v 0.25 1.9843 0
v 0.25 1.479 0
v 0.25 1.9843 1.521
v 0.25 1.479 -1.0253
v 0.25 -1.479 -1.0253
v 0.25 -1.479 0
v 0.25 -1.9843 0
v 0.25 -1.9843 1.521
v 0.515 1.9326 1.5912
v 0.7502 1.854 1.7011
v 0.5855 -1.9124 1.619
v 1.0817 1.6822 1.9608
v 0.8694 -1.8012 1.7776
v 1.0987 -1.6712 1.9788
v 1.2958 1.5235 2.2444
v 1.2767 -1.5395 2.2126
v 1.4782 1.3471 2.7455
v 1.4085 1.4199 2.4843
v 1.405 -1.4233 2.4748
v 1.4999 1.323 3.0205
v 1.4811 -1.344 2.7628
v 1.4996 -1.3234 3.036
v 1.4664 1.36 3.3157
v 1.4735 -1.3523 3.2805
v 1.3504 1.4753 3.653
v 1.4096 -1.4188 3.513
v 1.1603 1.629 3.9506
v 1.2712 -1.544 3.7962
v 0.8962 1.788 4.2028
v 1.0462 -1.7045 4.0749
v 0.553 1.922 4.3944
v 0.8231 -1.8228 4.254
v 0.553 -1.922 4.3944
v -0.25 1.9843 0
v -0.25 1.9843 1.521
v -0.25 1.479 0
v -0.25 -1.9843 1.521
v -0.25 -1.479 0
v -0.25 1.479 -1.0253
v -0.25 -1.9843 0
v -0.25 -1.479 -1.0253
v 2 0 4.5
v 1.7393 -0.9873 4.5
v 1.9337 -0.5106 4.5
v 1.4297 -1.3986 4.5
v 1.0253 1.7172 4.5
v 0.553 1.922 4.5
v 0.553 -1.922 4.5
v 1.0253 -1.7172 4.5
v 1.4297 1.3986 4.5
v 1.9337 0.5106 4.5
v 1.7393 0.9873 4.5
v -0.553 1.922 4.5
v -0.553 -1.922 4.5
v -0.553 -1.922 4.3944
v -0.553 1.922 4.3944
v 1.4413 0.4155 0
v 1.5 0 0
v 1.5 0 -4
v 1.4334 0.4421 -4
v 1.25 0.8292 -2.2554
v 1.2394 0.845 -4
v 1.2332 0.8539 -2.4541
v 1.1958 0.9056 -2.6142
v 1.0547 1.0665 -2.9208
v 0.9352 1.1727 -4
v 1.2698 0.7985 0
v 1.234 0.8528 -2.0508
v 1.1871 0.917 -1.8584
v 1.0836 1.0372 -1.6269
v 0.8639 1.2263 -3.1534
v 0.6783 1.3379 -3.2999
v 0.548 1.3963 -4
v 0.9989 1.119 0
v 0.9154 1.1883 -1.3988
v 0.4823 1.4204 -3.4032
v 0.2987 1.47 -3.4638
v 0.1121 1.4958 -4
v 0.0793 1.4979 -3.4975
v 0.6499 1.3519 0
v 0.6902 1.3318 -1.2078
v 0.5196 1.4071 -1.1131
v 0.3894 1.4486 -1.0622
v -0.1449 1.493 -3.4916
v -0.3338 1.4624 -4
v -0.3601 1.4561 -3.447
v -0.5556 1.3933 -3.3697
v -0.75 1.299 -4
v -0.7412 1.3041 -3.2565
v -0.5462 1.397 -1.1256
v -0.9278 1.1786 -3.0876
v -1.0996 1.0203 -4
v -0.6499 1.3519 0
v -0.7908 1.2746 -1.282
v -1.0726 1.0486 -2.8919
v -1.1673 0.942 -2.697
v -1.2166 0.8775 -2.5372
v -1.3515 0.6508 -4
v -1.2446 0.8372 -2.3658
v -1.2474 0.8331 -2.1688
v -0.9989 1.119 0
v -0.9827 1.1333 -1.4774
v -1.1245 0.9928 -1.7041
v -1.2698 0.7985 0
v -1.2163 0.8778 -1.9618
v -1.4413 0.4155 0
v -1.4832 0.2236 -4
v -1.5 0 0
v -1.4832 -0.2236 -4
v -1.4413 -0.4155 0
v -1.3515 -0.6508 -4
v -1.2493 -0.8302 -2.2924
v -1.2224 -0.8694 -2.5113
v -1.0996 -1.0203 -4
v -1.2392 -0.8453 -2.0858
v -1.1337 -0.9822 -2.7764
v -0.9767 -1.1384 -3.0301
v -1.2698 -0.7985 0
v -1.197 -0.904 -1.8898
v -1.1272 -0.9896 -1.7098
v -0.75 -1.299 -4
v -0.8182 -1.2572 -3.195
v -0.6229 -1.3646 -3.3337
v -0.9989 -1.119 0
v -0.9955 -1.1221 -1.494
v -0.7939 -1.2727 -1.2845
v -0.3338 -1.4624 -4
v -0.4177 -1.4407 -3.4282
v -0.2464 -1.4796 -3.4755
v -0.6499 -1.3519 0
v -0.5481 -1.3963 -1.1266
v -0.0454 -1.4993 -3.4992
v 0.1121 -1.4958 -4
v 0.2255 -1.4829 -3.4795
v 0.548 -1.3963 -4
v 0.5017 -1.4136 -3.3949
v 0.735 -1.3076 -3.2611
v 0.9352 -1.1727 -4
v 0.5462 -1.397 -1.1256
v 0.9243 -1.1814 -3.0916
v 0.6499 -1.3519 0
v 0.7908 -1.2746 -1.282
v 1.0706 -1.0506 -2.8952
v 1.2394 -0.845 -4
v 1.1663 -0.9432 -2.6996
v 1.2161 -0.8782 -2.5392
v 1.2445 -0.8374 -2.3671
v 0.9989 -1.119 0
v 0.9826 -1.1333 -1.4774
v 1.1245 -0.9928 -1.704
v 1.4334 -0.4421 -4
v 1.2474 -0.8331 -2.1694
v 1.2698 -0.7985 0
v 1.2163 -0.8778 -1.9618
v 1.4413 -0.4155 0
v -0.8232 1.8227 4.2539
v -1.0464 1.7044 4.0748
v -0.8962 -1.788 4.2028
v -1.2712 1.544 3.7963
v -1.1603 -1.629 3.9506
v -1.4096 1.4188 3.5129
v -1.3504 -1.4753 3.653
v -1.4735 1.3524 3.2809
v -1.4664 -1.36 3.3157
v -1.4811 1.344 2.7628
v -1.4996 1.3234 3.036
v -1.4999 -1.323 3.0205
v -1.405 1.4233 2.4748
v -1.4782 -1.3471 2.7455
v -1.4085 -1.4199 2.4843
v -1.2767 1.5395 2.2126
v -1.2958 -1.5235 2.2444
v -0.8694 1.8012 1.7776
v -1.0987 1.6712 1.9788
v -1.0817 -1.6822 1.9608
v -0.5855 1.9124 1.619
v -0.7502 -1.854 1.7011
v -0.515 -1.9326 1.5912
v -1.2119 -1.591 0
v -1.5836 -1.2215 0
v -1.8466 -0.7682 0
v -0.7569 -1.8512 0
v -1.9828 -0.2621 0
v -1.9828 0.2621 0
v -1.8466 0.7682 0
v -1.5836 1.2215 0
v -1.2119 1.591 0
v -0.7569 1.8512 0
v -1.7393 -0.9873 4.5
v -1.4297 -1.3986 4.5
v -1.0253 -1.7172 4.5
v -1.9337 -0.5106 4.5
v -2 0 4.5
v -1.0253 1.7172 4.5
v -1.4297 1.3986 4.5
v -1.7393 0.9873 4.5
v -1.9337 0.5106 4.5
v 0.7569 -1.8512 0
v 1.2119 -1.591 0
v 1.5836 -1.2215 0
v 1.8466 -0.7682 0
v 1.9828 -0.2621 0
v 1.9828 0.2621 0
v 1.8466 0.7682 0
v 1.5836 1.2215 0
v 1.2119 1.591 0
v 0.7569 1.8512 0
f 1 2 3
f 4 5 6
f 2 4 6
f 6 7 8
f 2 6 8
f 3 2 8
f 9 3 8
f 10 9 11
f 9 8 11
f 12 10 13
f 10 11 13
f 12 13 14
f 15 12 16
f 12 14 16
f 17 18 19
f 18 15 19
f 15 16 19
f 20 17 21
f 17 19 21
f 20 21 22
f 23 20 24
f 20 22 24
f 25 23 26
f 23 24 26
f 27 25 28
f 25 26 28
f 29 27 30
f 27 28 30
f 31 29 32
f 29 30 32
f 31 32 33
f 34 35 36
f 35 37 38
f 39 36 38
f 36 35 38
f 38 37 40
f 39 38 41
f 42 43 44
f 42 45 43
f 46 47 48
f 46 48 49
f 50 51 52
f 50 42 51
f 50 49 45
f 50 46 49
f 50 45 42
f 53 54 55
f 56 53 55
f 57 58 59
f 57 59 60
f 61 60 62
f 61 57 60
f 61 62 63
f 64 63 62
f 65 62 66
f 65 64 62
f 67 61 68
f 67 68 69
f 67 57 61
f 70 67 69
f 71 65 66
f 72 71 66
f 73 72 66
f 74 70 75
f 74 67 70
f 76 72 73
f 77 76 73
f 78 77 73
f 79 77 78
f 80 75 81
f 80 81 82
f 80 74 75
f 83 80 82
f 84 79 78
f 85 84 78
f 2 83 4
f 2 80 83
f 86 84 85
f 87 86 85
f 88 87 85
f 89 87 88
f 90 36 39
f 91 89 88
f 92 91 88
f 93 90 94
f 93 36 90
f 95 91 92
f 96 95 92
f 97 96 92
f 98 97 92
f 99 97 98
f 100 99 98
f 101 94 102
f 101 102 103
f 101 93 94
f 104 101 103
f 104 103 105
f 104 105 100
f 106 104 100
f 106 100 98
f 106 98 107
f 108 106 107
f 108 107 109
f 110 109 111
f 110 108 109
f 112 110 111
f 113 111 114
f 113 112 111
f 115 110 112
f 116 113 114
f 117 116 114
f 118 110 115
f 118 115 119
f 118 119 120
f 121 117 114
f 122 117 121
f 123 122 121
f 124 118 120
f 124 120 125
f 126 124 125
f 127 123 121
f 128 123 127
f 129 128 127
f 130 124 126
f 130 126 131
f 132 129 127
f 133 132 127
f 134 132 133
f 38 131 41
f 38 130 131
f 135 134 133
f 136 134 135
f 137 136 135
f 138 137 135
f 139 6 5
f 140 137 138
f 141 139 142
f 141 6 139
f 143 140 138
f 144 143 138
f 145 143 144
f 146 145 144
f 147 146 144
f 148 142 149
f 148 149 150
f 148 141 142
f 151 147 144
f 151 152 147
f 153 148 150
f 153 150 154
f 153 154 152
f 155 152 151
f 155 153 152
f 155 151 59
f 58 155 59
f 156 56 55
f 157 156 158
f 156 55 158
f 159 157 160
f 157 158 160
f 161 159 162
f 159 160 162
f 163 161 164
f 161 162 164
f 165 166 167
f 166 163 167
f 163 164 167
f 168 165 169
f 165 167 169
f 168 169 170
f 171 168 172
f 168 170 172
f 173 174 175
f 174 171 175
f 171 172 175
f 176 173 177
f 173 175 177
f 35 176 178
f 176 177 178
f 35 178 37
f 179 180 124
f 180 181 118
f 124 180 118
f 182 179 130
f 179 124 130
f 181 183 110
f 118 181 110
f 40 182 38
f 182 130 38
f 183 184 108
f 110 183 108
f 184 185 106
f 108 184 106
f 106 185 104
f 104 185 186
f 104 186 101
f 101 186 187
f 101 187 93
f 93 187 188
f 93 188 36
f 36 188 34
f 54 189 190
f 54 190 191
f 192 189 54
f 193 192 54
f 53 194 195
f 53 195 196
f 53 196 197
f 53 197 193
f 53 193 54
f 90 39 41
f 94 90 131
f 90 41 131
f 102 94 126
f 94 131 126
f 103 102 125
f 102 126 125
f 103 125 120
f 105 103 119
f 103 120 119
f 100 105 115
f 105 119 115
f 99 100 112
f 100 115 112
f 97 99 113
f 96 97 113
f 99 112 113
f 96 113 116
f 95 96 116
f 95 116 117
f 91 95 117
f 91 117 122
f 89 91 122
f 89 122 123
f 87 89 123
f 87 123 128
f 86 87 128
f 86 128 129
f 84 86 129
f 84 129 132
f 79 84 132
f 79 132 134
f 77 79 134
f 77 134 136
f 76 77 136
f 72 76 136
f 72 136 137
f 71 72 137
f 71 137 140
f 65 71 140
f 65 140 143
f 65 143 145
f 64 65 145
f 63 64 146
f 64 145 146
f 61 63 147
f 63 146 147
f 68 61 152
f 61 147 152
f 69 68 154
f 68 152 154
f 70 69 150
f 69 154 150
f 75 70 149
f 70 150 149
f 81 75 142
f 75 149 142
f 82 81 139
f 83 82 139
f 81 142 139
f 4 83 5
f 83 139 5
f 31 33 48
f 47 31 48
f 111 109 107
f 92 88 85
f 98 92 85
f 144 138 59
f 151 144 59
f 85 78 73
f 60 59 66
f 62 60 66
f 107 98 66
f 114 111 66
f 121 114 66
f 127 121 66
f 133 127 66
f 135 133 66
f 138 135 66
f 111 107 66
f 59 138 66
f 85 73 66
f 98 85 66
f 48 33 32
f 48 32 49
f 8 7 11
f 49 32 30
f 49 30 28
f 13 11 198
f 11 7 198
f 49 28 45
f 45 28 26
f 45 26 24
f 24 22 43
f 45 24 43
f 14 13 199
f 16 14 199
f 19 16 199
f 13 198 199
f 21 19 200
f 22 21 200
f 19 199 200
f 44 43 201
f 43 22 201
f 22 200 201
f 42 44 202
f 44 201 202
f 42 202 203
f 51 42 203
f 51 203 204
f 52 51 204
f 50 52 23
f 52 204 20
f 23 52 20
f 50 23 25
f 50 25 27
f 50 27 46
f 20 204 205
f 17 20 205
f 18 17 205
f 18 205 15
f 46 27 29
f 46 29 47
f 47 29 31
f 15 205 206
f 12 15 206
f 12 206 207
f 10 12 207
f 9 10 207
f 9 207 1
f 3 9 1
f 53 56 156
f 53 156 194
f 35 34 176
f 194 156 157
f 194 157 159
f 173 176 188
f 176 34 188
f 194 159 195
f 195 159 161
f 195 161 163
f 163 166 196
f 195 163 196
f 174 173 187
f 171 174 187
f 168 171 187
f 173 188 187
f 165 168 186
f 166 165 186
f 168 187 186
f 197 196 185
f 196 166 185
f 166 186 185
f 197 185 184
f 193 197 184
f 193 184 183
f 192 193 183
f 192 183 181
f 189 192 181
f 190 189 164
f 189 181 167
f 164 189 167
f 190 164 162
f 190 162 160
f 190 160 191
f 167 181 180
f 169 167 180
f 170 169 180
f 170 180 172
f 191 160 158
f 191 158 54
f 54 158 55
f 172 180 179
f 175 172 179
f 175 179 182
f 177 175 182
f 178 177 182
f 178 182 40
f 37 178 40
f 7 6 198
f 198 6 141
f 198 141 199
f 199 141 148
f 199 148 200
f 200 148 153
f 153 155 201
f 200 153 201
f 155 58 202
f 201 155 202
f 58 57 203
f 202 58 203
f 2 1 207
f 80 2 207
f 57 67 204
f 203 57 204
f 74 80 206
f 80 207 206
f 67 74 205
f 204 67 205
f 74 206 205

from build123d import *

# Parameters (mm, degrees)
F0_R     = 1.5
F1_DEPTH = 4
F0_R_2   = 2
F2_DEPTH = 4.5
F4_DEPTH = 2.5


with BuildPart() as f1:
    # F0 (on Top) → F1 (new body)
    with BuildSketch(Plane.XY):
        Circle(F0_R)
    extrude(amount=-F1_DEPTH)

    # F0 (on Top) → F2 (join)
    with BuildSketch(Plane.XY):
        Circle(F0_R_2)
        Circle(F0_R, mode=Mode.SUBTRACT)
        Circle(F0_R)
    extrude(amount=F2_DEPTH)

    # F3 (on Front) → F4 (cut, symmetric)
    with BuildSketch(Plane.XZ):
        with BuildLine():
            ThreePointArc((0.25, 1.5209800542), (1.1456439237, 2.0317541634), (1.5, 3))
            ThreePointArc((1.5, 3), (1.2408554332, 3.8427798015), (0.5529629416, 4.3943571943))
            Line((0.5529629416, 4.3943571943), (-0.5529629416, 4.3943571943))
            ThreePointArc((-0.5529629416, 4.3943571943), (-1.4917310142, 2.8427149678), (-0.25, 1.5209800542))
            Line((-0.25, 1.5209800542), (0.25, 1.5209800542))
        make_face()
        with BuildLine():
            Line((-0.5529629416, 4.3943571943), (0.5529629416, 4.3943571943))
            ThreePointArc((0.5529629416, 4.3943571943), (0.2814819786, 4.473352604), (0, 4.5))
            ThreePointArc((0, 4.5), (-0.2814819786, 4.473352604), (-0.5529629416, 4.3943571943))
        make_face()
        with BuildLine():
            ThreePointArc((0, 4.5), (0.2814819786, 4.473352604), (0.5529629416, 4.3943571943))
            Line((0.5529629416, 4.3943571943), (0.5529629416, 4.5))
            Line((0.5529629416, 4.5), (0, 4.5))
        make_face()
        with BuildLine():
            Line((0.25, -1.0252551286), (0.25, 1.5209800542))
            ThreePointArc((0.25, 1.5209800542), (0, 1.5), (-0.25, 1.5209800542))
            Line((-0.25, 1.5209800542), (-0.25, -1.0252551286))
            ThreePointArc((-0.25, -1.0252551286), (0, -1), (0.25, -1.0252551286))
        make_face()
        with BuildLine():
            ThreePointArc((-0.25, 1.5209800542), (0, 1.5), (0.25, 1.5209800542))
            Line((0.25, 1.5209800542), (-0.25, 1.5209800542))
        make_face()
        with BuildLine():
            ThreePointArc((-0.5529629416, 4.3943571943), (-0.2814819786, 4.473352604), (0, 4.5))
            Line((0, 4.5), (-0.5529629416, 4.5))
            Line((-0.5529629416, 4.5), (-0.5529629416, 4.3943571943))
        make_face()
        with BuildLine():
            Line((-0.25, -1.0252551286), (0.25, -1.0252551286))
            ThreePointArc((0.25, -1.0252551286), (0, -1), (-0.25, -1.0252551286))
        make_face()
        with BuildLine():
            ThreePointArc((1.25, -2.25), (0.9682458366, -1.459430585), (0.25, -1.0252551286))
            Line((0.25, -1.0252551286), (-0.25, -1.0252551286))
            ThreePointArc((-0.25, -1.0252551286), (-0.790569415, -3.2182458366), (1.25, -2.25))
        make_face()
    extrude(amount=F4_DEPTH, both=True, mode=Mode.SUBTRACT)


solid = f1.part
